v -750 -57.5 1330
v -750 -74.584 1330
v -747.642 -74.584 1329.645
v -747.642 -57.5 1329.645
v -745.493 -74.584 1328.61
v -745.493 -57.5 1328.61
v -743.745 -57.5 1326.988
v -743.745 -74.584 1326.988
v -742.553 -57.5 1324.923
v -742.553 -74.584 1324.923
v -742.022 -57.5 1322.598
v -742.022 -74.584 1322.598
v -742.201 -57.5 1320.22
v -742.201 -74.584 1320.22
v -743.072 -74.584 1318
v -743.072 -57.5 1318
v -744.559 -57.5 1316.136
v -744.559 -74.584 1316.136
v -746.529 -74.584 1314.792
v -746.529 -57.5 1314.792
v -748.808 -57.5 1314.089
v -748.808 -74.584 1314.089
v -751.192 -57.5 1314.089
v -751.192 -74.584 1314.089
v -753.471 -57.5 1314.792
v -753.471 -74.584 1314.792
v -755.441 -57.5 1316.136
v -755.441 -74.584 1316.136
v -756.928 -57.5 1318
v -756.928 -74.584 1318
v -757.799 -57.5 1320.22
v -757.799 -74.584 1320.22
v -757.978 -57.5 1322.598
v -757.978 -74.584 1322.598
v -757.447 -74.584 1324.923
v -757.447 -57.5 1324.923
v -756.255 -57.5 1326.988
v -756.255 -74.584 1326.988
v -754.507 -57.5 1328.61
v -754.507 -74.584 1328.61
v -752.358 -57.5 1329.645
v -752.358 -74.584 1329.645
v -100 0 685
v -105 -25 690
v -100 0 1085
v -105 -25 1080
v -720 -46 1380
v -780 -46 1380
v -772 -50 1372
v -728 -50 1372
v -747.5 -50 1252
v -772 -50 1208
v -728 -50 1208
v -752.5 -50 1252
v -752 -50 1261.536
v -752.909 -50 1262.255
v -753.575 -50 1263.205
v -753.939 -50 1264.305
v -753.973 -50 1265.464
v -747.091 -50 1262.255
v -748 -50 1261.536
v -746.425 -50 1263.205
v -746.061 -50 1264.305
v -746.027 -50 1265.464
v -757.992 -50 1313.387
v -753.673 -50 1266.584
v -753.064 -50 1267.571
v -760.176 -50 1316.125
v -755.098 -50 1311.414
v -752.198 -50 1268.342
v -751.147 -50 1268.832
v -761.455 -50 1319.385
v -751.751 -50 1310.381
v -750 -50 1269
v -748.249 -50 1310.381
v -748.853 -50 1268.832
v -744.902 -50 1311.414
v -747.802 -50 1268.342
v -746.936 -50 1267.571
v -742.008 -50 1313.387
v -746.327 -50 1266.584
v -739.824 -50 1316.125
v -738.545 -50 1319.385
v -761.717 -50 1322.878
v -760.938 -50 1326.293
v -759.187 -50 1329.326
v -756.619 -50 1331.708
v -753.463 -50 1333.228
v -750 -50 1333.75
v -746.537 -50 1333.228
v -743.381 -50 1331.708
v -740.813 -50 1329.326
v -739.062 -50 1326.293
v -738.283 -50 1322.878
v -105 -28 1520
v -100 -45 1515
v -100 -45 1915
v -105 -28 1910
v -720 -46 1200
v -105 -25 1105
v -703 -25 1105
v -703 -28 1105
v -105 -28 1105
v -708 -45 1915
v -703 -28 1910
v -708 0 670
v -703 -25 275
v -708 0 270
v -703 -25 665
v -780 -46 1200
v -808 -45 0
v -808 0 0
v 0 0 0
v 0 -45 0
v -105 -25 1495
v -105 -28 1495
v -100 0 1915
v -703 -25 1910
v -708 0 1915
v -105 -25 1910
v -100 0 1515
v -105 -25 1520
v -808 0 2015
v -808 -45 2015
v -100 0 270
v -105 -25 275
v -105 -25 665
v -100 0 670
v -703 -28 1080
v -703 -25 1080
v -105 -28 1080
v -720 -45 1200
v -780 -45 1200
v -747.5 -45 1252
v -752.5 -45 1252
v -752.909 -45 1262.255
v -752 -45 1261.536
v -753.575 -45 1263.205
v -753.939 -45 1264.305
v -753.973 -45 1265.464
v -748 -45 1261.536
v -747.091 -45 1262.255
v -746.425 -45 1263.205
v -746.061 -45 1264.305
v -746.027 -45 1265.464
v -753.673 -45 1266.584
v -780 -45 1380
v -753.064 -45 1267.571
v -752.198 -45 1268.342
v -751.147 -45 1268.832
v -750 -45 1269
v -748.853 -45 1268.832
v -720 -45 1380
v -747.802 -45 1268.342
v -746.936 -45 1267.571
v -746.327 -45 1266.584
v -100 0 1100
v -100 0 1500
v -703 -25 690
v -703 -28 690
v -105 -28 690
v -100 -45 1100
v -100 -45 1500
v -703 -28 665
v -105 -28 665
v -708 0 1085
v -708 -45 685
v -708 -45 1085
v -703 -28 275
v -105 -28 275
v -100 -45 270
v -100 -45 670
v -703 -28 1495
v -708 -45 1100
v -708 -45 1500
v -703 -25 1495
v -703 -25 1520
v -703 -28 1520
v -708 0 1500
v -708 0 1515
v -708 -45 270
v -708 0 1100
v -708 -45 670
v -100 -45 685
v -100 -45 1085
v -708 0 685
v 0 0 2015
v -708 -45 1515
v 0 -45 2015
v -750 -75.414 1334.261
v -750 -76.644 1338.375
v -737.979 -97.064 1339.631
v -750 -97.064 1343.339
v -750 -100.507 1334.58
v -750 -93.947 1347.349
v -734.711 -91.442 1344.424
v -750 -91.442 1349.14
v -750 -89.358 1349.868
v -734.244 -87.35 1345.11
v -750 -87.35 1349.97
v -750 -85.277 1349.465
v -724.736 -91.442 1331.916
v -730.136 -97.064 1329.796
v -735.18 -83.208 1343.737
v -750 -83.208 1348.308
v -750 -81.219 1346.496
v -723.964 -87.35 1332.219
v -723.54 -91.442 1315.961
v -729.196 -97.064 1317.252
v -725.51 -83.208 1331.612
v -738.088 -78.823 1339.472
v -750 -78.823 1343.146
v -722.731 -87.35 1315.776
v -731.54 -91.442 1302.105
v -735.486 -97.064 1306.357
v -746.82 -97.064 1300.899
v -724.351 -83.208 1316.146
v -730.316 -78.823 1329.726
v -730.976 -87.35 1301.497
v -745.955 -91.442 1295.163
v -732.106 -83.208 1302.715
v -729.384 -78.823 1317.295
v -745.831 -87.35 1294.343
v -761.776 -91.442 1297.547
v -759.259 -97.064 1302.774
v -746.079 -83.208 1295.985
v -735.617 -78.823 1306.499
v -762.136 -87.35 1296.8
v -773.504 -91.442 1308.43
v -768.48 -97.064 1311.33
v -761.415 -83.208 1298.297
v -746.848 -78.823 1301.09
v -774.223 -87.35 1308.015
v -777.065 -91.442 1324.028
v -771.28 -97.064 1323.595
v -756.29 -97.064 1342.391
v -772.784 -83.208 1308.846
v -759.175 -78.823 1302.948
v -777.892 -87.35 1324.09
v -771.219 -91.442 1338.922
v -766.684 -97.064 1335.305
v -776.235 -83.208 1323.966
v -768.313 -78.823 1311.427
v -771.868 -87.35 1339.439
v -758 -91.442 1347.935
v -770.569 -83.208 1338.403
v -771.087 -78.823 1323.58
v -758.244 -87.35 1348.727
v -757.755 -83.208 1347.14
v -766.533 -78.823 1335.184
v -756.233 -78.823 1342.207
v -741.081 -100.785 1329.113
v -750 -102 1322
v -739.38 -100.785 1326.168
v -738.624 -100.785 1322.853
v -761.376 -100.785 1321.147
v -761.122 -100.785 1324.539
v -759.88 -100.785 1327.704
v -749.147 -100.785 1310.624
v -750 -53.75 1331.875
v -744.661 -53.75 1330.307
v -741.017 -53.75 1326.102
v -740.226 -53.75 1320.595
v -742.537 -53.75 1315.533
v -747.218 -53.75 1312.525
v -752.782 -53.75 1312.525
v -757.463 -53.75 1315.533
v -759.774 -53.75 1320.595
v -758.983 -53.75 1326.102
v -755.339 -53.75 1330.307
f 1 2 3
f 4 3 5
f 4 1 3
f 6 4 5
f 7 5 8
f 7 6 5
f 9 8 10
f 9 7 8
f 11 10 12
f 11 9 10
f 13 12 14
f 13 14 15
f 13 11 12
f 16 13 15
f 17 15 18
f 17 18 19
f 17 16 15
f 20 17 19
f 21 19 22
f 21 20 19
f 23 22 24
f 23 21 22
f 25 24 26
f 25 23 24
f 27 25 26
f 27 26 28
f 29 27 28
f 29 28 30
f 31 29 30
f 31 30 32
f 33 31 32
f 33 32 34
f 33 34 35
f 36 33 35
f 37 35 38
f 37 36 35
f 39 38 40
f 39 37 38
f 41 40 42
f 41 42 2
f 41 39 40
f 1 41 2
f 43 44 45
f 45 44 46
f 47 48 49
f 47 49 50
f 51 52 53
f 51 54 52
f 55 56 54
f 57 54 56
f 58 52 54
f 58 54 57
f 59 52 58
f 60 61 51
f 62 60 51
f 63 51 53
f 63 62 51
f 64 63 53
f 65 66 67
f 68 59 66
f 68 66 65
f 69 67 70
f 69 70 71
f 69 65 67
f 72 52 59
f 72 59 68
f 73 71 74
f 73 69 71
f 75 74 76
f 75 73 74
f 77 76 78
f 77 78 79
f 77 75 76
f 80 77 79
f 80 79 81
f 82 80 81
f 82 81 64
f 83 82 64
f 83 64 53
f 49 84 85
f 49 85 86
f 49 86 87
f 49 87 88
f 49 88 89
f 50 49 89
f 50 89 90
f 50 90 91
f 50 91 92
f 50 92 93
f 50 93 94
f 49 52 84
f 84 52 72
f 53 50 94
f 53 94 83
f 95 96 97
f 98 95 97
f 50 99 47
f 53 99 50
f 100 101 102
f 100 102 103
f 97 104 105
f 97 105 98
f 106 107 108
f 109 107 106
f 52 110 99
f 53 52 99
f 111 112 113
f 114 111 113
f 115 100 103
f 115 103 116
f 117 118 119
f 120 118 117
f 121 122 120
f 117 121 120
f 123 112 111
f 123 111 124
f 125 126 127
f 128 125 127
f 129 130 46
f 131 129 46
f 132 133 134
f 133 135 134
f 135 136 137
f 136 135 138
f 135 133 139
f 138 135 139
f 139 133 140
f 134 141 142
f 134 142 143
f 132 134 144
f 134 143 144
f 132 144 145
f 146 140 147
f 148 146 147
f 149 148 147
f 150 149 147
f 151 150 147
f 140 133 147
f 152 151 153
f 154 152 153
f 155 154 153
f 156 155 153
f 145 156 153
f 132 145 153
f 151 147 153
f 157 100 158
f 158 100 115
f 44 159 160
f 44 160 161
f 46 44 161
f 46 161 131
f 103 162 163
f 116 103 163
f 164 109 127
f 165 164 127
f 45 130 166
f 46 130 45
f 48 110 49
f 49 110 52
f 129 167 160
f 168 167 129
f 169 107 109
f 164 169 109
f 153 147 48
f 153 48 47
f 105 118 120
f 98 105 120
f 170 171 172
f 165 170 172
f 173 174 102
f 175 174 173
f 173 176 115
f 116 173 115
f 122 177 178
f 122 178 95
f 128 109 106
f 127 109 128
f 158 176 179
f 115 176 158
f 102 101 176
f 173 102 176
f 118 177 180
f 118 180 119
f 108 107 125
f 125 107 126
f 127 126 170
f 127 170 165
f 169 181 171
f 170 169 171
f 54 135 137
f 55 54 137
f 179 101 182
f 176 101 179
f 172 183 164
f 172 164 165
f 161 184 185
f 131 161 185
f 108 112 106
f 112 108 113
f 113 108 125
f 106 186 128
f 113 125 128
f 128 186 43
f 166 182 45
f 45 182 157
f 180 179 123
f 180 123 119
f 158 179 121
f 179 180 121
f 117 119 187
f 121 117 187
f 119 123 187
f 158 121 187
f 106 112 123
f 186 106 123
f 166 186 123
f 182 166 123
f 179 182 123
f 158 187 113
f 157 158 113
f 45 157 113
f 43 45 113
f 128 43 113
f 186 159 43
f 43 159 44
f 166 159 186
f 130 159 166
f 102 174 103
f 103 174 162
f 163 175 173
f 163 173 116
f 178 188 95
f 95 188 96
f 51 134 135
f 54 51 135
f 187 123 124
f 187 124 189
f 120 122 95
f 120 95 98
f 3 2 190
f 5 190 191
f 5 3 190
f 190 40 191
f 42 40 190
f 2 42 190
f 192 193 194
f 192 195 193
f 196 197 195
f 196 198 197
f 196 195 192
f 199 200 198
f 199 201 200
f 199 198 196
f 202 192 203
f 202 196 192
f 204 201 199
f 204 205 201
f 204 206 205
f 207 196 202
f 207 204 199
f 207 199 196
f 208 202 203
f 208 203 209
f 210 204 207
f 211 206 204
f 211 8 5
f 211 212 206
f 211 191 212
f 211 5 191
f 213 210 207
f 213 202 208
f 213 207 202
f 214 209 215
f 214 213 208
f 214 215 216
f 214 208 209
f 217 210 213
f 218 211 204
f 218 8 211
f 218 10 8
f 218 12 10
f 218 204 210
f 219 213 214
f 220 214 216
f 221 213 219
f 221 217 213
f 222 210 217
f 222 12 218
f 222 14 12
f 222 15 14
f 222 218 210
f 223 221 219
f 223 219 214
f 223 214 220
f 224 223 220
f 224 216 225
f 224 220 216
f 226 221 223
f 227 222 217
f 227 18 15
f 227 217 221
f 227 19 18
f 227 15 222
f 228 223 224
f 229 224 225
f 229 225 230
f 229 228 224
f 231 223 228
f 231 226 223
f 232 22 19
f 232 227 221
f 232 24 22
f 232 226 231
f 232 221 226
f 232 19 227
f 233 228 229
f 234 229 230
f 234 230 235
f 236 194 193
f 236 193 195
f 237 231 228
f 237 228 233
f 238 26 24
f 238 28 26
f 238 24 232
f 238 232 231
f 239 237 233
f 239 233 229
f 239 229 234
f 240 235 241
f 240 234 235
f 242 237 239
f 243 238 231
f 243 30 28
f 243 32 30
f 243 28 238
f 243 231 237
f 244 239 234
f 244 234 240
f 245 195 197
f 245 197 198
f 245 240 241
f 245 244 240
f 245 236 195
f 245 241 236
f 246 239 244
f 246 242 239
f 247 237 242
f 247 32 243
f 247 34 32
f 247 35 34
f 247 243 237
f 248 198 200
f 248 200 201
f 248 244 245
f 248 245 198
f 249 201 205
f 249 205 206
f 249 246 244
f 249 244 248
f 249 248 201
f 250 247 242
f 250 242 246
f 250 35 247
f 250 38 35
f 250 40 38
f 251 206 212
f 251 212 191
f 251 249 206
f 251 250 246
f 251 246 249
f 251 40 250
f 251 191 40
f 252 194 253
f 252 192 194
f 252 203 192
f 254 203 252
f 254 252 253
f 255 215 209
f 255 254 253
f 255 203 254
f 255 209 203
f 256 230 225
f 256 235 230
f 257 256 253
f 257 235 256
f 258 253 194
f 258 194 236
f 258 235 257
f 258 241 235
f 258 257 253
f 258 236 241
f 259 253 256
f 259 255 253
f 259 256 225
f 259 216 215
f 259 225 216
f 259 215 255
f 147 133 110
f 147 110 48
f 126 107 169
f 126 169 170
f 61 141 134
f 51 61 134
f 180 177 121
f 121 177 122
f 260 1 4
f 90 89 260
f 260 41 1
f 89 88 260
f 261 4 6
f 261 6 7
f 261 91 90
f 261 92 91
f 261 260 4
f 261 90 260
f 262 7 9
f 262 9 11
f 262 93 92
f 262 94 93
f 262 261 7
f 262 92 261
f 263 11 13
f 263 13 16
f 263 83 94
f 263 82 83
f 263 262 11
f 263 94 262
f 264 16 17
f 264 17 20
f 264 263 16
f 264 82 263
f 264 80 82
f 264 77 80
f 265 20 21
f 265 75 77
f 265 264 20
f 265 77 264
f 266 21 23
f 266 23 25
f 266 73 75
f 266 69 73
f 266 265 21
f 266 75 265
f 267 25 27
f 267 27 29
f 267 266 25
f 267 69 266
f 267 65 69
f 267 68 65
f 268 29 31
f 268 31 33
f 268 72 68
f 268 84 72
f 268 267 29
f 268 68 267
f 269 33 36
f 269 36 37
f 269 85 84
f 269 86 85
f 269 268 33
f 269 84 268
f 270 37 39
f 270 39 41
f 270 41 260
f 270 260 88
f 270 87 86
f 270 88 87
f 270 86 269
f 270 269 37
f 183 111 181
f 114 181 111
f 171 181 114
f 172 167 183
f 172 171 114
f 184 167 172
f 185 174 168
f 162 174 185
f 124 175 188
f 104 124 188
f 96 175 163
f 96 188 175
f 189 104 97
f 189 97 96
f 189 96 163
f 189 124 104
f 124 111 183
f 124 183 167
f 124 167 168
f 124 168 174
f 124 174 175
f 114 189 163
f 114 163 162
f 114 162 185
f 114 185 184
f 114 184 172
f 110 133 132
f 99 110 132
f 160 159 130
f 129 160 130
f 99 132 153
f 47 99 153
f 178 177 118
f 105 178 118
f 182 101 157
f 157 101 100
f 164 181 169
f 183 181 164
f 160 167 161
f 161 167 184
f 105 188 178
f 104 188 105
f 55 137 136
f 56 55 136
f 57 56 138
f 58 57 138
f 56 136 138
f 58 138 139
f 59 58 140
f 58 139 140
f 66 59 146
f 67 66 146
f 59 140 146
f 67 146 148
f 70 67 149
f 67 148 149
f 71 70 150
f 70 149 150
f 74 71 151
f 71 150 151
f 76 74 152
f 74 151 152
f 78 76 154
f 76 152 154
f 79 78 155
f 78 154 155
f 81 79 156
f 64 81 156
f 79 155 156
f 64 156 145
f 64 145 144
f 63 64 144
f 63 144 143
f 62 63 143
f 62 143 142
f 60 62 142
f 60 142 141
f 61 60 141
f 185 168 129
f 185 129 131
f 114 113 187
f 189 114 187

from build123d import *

# Parameters (mm, degrees)
F0_W     = 808
F0_H     = 2015
F0_W_2   = 598
F0_H_2   = 390
F1_DEPTH = 45
F2_SIZE2 = 5
F2_SIZE  = 17
F3_SIZE2 = 25
F3_SIZE  = 5
F4_W     = 60
F4_H     = 180
F5_DEPTH = 5
F9_SIZE2 = 4
F9_SIZE  = 8


with BuildPart() as f1:
    # F0 (on Front) → F1 (new body)
    with BuildSketch(Plane.XZ):
        with Locations((-404, 1007.5)):
            Rectangle(F0_W, F0_H)
        with Locations((-404, 470)):
            Rectangle(F0_W_2, F0_H_2, mode=Mode.SUBTRACT)
        with Locations((-404, 885)):
            Rectangle(F0_W_2, F0_H_2, mode=Mode.SUBTRACT)
        with Locations((-404, 1300)):
            Rectangle(F0_W_2, F0_H_2, mode=Mode.SUBTRACT)
        with Locations((-404, 1715)):
            Rectangle(F0_W_2, F0_H_2, mode=Mode.SUBTRACT)
    extrude(amount=F1_DEPTH)

    # F2
    f2_edges = [f1.edges().sort_by_distance(p)[0] for p in [
        (-404, -45, 275),
        (-105, -45, 470),
        (-703, -45, 470),
        (-404, -45, 665),
        (-703, -45, 885),
        (-404, -45, 1080),
        (-404, -45, 690),
        (-105, -45, 885),
        (-404, -45, 1105),
        (-105, -45, 1300),
        (-404, -45, 1495),
        (-703, -45, 1300),
        (-703, -45, 1715),
        (-404, -45, 1910),
        (-105, -45, 1715),
        (-404, -45, 1520),
    ]]
    chamfer(f2_edges, length=F2_SIZE, length2=F2_SIZE2)

    # F3
    f3_edges = [f1.edges().sort_by_distance(p)[0] for p in [
        (-404, 0, 1520),
        (-105, 0, 1715),
        (-703, 0, 1715),
        (-404, 0, 1910),
        (-105, 0, 1300),
        (-404, 0, 1105),
        (-404, 0, 1495),
        (-703, 0, 1300),
        (-404, 0, 1080),
        (-703, 0, 885),
        (-105, 0, 885),
        (-404, 0, 690),
        (-404, 0, 275),
        (-105, 0, 470),
        (-404, 0, 665),
        (-703, 0, 470),
    ]]
    f3_side = f1.faces().sort_by_distance((-404, 0, 21.70965))[0]
    chamfer(f3_edges, length=F3_SIZE, length2=F3_SIZE2, reference=f3_side)


with BuildPart() as f5:
    # F4 (on face) → F5 (new body)
    with BuildSketch(Plane.XZ.offset(45)):
        with Locations((-750, 1290)):
            Rectangle(F4_W, F4_H)
        with BuildLine():
            ThreePointArc((-752, 1261.5358983849), (-750, 1269), (-748, 1261.5358983849))
            Line((-748, 1261.5358983849), (-747.5, 1252))
            Line((-747.5, 1252), (-752.5, 1252))
            Line((-752.5, 1252), (-752, 1261.5358983849))
        make_face(mode=Mode.SUBTRACT)
    extrude(amount=F5_DEPTH)

    # F7 (on offset) → F8 (revolve)
    with BuildSketch(Plane(origin=(-750, 0, 0), x_dir=(0, -1, 0), z_dir=(-1, 0, 0))):
        with BuildLine():
            Line((88, 1322), (102, 1322))
            add(Edge.make_bspline(
                [(102, 1322), (102, 1346.2112931563), (90.0211741501, 1349.7066674326), (78.0423483002, 1353.2020417089), (74.583592135, 1330)],
                knots=[1.5707963268, 1.5707963268, 1.5707963268, 2.9967168029, 2.9967168029, 4.4226372789, 4.4226372789, 4.4226372789], degree=2, weights=[1, 0.7564289729, 1, 0.7564289729, 1]))
            Line((74.583592135, 1330), (57.5, 1330))
            Line((57.5, 1330), (49.5, 1334))
            Line((49.5, 1334), (49.5, 1330))
            Line((49.5, 1330), (49.5, 1322))
            Line((49.5, 1322), (88, 1322))
        make_face()
    revolve(axis=Axis((-750, -68.75, 1322), (0, 1, 0)))

    # F9
    f9_edges = [f5.edges().sort_by_distance(p)[0] for p in [
        (-780, -50, 1290),
        (-750, -50, 1200),
        (-720, -50, 1290),
        (-750, -50, 1380),
    ]]
    f9_side = f5.faces().sort_by_distance((-750, -50, 1288.906922))[0]
    chamfer(f9_edges, length=F9_SIZE, length2=F9_SIZE2, reference=f9_side)


solid = Compound([f1.part, f5.part])
